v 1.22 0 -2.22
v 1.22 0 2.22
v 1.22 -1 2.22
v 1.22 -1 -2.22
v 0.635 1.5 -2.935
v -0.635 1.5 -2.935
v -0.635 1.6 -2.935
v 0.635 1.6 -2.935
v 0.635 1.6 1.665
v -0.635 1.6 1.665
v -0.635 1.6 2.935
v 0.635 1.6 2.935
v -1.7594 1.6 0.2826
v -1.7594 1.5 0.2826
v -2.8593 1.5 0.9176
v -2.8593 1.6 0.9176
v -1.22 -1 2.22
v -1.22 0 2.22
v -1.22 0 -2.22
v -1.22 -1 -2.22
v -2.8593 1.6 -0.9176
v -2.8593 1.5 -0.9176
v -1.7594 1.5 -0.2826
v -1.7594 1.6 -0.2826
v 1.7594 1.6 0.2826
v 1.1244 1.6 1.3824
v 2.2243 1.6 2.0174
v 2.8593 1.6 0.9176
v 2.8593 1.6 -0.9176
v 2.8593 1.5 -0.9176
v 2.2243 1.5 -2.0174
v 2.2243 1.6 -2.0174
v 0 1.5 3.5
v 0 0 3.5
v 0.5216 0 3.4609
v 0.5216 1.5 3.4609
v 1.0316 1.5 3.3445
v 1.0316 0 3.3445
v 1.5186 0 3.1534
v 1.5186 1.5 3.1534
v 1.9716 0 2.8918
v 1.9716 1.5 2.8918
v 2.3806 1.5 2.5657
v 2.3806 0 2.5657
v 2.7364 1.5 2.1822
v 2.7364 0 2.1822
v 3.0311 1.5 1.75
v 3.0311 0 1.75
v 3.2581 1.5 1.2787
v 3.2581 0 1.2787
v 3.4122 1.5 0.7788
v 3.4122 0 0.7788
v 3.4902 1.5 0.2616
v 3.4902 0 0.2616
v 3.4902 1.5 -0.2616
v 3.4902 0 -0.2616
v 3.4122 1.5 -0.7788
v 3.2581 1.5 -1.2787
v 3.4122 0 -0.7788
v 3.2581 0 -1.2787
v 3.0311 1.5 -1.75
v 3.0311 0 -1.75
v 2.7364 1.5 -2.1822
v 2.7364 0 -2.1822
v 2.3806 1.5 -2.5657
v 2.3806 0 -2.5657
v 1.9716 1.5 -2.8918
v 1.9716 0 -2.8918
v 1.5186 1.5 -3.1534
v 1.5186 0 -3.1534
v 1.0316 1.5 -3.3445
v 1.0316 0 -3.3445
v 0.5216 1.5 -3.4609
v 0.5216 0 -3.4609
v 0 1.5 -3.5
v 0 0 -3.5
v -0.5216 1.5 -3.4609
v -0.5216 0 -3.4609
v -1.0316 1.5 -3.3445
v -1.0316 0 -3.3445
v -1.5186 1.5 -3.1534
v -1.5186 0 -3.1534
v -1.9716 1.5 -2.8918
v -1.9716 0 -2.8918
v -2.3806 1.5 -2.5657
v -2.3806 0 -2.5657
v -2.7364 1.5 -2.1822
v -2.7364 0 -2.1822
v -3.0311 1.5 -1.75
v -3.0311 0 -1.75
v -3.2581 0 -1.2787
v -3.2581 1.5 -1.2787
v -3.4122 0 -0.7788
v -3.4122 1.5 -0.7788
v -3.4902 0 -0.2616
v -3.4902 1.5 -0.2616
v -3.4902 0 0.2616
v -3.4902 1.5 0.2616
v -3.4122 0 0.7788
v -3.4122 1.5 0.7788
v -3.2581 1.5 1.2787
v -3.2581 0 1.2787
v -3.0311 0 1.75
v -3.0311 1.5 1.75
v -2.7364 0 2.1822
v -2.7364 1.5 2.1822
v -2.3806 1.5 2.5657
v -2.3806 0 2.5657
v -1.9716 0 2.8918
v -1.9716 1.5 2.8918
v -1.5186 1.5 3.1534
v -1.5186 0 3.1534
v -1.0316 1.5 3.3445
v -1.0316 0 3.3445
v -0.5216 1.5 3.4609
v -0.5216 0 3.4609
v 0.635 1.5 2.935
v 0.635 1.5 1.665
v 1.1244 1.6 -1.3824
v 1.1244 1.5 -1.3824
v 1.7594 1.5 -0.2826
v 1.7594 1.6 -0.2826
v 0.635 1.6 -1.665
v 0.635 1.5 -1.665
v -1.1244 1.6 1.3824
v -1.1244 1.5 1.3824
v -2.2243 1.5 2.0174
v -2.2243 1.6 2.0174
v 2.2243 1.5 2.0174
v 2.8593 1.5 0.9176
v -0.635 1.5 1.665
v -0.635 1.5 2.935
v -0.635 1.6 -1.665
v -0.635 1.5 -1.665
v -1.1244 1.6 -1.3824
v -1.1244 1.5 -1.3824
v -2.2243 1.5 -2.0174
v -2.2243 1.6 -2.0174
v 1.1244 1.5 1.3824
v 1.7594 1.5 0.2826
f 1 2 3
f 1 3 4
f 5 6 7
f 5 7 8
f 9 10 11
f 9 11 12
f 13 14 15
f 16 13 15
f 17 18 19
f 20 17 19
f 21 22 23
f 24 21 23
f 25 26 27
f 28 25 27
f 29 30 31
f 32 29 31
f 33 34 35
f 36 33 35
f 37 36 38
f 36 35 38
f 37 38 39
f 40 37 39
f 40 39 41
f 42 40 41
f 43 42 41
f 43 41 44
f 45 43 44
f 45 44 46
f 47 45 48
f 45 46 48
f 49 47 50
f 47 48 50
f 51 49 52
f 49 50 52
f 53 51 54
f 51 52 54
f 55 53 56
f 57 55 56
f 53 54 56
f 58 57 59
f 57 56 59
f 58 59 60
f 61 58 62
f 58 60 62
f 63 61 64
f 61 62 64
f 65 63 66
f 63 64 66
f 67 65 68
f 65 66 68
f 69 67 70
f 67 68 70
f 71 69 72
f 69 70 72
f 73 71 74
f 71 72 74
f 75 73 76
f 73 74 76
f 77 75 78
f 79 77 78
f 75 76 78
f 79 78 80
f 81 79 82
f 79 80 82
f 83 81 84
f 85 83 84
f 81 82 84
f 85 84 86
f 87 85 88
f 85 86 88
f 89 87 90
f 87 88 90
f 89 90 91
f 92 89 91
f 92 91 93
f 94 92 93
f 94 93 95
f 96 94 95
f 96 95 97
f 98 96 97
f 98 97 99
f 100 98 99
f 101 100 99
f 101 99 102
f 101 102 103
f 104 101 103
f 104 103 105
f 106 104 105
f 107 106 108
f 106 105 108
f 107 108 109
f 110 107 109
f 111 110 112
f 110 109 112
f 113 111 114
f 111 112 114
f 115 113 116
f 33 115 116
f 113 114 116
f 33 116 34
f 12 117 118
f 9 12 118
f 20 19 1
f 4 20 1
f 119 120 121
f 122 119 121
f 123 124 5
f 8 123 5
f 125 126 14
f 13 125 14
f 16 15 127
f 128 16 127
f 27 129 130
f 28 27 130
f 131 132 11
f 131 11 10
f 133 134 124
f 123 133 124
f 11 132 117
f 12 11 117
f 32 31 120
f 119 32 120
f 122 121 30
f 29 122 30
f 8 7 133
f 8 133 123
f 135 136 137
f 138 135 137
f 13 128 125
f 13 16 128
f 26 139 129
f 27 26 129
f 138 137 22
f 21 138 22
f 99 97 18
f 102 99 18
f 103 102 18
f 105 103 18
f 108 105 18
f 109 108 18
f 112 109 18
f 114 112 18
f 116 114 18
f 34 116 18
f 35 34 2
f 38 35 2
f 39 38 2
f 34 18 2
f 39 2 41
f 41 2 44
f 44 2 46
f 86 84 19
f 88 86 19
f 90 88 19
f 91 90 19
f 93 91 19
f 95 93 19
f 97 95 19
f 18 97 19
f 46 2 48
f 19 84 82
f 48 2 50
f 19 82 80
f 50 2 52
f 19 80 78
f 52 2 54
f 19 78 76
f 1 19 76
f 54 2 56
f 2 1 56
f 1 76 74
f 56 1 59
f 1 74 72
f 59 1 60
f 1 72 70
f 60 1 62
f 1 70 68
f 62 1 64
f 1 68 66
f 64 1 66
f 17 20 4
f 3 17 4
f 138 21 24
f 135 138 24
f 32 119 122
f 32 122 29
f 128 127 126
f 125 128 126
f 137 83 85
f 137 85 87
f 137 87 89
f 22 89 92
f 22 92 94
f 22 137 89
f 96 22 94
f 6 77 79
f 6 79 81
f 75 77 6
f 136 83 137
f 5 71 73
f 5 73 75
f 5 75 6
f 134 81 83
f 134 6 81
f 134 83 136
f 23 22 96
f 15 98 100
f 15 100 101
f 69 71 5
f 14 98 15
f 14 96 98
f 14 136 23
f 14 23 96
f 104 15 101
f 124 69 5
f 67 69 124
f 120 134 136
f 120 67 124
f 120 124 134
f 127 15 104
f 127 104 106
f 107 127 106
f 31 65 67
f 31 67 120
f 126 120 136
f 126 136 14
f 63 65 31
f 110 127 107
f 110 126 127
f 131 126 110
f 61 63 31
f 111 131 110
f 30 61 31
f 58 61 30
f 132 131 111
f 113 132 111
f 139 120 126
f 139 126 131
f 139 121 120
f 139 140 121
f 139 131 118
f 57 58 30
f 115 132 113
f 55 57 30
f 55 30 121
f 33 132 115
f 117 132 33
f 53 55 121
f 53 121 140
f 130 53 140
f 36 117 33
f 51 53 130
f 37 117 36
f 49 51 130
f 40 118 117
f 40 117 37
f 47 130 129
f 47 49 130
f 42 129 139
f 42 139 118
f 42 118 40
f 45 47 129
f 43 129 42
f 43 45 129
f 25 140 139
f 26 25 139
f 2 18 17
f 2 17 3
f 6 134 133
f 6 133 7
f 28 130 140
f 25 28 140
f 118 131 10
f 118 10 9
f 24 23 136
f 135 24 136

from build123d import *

# Parameters (mm, degrees)
SKETCH1_R           = 3.5
BOSS_EXTRUDE1_DEPTH = 1.5
SKETCH1_3_W         = 2.44
SKETCH1_3_H         = 4.44
BOSS_EXTRUDE2_DEPTH = 1
SKETCH2_W           = 1.27
SKETCH2_H           = 1.27
BOSS_EXTRUDE3_DEPTH = 0.1


with BuildPart() as part:
    # Sketch1 → Boss-Extrude1 (new body)
    with BuildSketch(Plane(origin=(0, 0, 0), x_dir=(1, 0, 0), z_dir=(0, 1, 0))):
        Circle(SKETCH1_R)
    extrude(amount=BOSS_EXTRUDE1_DEPTH)

    # Sketch1<3> → Boss-Extrude2 (add)
    with BuildSketch(Plane(origin=(0, 0, 0), x_dir=(1, 0, 0), z_dir=(0, 1, 0))):
        Rectangle(SKETCH1_3_W, SKETCH1_3_H)
    extrude(amount=-BOSS_EXTRUDE2_DEPTH)

    # Sketch2 → Boss-Extrude3 (add)
    with BuildSketch(Plane(origin=(0, 1.5, 0), x_dir=(1, 0, 0), z_dir=(0, 1, 0))):
        with Locations((0, 2.3)):
            Rectangle(SKETCH2_W, SKETCH2_H)
        Polygon((2.85928456, 0.917573869), (2.22428456, 2.017426131), (1.124432297, 1.382426131), (1.759432297, 0.282573869), align=None)
        Polygon((2.22428456, -2.017426131), (2.85928456, -0.917573869), (1.759432297, -0.282573869), (1.124432297, -1.382426131), align=None)
        with Locations((0, -2.3)):
            Rectangle(SKETCH2_W, SKETCH2_H)
        Polygon((-2.85928456, -0.917573869), (-2.22428456, -2.017426131), (-1.124432297, -1.382426131), (-1.759432297, -0.282573869), align=None)
        Polygon((-2.22428456, 2.017426131), (-2.85928456, 0.917573869), (-1.759432297, 0.282573869), (-1.124432297, 1.382426131), align=None)
    extrude(amount=BOSS_EXTRUDE3_DEPTH)


solid = part.part
